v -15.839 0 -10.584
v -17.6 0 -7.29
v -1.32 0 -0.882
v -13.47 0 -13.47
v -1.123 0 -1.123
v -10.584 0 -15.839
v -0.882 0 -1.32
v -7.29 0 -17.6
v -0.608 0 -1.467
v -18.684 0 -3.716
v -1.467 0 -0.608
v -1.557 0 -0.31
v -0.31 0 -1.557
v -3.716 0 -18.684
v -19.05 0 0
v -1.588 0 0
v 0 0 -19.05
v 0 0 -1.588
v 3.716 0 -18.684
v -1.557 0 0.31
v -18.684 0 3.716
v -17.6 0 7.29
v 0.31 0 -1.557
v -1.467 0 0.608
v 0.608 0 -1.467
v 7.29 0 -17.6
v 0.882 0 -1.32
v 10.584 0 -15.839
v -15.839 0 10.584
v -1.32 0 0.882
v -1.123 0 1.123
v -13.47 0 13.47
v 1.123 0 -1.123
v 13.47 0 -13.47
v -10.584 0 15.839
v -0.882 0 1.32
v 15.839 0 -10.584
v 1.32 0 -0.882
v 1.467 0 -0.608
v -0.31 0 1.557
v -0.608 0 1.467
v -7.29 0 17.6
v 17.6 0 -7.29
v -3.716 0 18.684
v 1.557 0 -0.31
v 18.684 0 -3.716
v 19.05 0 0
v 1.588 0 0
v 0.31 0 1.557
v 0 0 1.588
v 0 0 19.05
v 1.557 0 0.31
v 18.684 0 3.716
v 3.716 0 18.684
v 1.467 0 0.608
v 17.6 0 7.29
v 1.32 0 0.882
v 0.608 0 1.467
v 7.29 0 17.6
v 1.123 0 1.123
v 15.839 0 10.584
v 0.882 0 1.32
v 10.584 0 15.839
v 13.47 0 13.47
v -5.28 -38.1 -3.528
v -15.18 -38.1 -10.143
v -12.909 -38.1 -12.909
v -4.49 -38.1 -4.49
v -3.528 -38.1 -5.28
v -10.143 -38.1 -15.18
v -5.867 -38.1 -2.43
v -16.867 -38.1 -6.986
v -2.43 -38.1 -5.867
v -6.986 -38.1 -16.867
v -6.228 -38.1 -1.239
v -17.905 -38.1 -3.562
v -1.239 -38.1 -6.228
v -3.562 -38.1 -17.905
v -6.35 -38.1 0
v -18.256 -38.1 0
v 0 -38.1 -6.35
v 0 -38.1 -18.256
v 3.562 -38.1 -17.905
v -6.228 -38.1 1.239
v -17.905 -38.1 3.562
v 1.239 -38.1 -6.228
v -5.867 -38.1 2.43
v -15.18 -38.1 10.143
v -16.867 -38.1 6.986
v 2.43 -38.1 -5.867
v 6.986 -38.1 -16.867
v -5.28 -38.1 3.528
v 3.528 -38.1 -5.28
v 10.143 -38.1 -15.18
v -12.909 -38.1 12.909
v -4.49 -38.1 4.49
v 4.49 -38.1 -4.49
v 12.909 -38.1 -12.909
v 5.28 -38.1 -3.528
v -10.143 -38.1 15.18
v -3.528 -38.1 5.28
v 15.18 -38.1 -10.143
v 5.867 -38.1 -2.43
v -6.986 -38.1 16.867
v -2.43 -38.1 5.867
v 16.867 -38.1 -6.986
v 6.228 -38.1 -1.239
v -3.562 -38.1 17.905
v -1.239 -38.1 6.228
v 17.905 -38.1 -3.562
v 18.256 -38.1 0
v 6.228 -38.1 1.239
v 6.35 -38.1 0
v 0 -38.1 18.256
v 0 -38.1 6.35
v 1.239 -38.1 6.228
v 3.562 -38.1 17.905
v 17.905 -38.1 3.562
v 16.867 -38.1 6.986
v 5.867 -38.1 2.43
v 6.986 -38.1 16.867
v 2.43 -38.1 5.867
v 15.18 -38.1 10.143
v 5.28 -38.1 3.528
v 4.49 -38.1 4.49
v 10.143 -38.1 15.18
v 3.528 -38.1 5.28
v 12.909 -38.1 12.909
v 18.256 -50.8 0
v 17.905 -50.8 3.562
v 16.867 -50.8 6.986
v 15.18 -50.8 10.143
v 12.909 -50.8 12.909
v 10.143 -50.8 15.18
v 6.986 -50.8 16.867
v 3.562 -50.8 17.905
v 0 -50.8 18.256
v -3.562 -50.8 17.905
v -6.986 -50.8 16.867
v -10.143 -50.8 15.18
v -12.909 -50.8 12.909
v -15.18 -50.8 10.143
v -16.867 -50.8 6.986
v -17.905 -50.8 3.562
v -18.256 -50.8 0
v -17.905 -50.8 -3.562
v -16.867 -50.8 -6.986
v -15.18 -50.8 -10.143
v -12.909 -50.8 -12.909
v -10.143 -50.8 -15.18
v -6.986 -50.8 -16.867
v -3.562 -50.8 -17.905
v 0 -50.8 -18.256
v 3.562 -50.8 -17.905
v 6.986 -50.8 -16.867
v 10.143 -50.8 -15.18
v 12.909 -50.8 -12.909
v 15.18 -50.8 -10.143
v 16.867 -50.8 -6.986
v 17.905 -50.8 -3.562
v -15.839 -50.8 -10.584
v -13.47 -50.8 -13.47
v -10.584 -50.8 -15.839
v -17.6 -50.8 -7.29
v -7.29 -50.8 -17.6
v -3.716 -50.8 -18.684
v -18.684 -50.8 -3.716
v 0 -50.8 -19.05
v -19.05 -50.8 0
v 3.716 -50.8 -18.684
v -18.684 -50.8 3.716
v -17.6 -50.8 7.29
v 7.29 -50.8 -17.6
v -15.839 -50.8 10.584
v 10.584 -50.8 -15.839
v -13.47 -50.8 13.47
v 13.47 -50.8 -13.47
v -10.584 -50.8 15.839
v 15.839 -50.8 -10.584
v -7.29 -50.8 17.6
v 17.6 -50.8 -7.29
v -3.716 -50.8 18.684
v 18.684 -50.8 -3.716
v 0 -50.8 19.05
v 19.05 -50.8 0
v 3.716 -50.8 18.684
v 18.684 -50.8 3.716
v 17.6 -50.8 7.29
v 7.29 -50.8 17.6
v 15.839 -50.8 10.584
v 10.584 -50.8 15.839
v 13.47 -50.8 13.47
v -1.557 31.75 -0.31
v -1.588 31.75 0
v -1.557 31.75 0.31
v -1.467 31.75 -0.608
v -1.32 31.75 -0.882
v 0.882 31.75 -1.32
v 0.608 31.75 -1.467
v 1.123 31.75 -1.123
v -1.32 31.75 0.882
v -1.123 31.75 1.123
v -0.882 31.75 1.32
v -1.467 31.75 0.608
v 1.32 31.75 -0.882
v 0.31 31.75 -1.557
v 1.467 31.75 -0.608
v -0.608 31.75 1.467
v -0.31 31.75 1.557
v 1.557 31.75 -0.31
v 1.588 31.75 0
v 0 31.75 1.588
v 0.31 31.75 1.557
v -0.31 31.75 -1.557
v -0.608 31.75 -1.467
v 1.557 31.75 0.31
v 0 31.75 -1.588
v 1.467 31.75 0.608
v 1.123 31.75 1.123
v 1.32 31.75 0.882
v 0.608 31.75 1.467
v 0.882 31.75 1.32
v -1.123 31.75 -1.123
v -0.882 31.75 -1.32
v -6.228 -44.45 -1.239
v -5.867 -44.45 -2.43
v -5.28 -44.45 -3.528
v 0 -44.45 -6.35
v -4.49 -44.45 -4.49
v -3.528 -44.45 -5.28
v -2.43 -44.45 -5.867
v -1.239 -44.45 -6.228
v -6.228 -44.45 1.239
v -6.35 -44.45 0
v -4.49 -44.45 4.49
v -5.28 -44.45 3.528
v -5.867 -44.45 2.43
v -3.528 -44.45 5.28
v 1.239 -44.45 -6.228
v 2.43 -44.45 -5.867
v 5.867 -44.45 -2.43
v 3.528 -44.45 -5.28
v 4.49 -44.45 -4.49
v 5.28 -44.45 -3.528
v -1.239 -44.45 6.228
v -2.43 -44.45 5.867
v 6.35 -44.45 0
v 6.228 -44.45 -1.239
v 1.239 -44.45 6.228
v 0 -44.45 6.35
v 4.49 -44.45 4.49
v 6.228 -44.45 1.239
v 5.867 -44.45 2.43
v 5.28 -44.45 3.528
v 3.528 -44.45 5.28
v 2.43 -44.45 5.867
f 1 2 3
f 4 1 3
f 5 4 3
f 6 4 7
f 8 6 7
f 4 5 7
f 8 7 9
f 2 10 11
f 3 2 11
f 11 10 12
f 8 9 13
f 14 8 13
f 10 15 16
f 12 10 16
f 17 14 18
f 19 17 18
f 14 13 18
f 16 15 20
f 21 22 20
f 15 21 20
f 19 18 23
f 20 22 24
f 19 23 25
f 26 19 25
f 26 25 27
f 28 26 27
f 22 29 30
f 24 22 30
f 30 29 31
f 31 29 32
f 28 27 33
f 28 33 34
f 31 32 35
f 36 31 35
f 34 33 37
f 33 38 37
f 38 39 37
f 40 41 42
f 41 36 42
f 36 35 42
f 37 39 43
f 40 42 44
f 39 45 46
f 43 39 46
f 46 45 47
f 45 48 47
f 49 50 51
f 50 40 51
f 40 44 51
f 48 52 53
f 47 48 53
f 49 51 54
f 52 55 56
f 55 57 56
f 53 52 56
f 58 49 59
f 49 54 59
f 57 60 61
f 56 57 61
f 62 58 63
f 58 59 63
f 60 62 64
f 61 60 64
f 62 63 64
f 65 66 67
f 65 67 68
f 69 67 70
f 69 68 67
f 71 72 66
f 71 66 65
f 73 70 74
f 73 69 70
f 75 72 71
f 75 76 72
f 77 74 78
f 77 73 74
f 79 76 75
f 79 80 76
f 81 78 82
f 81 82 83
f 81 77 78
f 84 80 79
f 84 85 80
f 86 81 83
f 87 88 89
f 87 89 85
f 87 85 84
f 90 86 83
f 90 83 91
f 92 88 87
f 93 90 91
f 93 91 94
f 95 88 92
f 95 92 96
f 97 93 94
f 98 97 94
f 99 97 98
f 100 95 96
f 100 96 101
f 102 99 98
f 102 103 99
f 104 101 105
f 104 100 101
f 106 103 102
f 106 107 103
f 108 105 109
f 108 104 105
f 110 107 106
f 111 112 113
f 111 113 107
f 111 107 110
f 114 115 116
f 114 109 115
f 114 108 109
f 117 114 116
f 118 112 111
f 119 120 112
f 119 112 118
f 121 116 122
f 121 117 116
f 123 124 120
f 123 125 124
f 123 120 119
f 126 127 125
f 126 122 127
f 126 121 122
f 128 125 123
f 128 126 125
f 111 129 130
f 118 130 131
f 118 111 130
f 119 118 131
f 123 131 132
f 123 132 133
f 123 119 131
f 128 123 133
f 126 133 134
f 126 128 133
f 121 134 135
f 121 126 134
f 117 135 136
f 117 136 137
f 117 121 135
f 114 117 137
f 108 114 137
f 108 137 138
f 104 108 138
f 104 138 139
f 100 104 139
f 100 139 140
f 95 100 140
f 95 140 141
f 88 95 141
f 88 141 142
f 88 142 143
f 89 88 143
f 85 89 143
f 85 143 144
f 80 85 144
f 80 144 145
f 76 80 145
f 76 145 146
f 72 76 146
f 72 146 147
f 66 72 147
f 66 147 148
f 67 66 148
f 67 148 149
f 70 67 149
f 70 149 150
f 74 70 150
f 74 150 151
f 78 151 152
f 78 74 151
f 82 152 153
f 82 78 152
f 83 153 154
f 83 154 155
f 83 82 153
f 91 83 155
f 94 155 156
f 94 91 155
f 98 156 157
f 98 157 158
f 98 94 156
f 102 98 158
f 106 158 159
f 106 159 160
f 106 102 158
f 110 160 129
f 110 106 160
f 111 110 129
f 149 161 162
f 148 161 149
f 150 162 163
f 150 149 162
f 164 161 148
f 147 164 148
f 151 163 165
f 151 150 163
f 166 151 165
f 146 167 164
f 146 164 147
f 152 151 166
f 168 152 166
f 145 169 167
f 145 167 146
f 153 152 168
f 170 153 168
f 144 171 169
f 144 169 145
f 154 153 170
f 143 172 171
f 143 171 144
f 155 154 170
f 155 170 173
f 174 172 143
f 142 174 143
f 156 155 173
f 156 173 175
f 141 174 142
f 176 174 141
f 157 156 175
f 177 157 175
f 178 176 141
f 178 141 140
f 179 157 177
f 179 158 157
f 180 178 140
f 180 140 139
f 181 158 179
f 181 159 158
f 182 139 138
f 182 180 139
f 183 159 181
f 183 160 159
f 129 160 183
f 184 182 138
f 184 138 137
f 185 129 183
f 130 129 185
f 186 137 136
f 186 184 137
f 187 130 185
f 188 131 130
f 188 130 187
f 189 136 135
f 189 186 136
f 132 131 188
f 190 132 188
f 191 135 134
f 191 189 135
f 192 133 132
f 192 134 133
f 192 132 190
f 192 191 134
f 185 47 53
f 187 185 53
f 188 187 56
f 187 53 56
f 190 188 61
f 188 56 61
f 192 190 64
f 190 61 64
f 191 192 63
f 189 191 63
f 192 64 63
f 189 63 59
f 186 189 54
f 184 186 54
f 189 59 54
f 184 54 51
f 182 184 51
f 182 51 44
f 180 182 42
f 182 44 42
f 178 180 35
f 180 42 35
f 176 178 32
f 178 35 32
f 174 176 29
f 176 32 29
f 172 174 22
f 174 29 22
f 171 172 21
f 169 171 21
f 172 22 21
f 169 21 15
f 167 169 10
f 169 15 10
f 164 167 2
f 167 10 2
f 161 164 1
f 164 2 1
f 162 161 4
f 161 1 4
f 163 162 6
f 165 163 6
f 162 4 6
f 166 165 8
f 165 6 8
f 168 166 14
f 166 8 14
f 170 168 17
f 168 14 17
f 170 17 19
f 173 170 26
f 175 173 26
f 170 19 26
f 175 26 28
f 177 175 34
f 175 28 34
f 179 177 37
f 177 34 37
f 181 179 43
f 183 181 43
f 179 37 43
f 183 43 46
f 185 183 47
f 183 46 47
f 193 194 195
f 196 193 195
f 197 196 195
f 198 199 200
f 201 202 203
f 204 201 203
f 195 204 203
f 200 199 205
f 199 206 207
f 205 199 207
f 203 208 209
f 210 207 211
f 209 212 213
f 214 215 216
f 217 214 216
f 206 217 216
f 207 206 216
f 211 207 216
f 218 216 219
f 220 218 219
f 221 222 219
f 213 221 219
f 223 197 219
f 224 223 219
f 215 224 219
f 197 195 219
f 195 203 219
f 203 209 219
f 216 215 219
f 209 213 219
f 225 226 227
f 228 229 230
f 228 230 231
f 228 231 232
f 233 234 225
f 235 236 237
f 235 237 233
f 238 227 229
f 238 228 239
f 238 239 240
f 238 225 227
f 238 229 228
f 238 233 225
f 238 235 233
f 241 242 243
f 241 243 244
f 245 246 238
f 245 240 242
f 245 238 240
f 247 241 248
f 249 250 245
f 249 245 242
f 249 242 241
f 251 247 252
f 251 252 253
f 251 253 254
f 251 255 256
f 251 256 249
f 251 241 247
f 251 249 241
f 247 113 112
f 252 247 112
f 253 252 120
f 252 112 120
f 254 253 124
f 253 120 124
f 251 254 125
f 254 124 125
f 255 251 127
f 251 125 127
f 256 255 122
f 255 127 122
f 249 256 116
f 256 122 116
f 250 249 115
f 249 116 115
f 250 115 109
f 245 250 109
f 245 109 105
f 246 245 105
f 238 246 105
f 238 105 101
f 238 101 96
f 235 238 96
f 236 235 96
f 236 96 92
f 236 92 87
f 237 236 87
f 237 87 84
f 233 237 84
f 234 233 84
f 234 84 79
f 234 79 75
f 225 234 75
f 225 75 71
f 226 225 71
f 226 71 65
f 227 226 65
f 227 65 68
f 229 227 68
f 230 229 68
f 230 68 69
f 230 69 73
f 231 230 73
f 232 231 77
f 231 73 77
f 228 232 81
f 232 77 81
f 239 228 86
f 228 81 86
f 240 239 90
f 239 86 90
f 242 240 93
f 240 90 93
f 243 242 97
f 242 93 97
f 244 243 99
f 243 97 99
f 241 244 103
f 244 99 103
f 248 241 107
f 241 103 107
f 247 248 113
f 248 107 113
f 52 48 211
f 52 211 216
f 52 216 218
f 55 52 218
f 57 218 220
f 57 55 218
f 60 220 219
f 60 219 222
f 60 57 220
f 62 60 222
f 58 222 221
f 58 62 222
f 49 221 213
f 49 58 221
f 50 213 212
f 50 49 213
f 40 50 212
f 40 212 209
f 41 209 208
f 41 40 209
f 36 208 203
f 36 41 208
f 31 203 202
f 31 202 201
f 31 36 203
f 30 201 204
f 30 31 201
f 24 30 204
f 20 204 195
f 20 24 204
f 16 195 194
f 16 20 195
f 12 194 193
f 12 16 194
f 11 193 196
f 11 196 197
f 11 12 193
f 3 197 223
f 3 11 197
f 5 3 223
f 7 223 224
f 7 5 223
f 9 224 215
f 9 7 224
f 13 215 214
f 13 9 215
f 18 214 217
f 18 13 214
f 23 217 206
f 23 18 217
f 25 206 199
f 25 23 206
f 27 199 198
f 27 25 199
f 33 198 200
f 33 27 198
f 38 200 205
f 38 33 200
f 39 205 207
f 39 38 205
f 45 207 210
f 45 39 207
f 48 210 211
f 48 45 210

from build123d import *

# Parameters (mm, degrees)
F0_R     = 19.05
F0_R_2   = 18.25625
F1_DEPTH = 50.8
F2_R     = 6.35
F3_DEPTH = 44.45
F0_R_3   = 6.35
F4_DEPTH = 38.1
F5_R     = 1.5875
F6_DEPTH = 31.75


with BuildPart() as f1:
    # F0 (on Front) → F1 (new body)
    with BuildSketch(Plane.XZ):
        Circle(F0_R)
        Circle(F0_R_2, mode=Mode.SUBTRACT)
    extrude(amount=F1_DEPTH)



with BuildPart() as f3:
    # F2 (on Front) → F3 (new body)
    with BuildSketch(Plane.XZ):
        Circle(F2_R)
    extrude(amount=F3_DEPTH)


with BuildPart() as f1_1:
    add(f1.part)

    add(f3.part)  # F4 merges F3
    # F0 (on Front) → F4 (join)
    with BuildSketch(Plane.XZ):
        Circle(F0_R_2)
        Circle(F0_R_3, mode=Mode.SUBTRACT)
    extrude(amount=F4_DEPTH)

    # F5 (on Front) → F6 (join)
    with BuildSketch(Plane.XZ):
        Circle(F5_R)
    extrude(amount=-F6_DEPTH)


solid = f1_1.part
